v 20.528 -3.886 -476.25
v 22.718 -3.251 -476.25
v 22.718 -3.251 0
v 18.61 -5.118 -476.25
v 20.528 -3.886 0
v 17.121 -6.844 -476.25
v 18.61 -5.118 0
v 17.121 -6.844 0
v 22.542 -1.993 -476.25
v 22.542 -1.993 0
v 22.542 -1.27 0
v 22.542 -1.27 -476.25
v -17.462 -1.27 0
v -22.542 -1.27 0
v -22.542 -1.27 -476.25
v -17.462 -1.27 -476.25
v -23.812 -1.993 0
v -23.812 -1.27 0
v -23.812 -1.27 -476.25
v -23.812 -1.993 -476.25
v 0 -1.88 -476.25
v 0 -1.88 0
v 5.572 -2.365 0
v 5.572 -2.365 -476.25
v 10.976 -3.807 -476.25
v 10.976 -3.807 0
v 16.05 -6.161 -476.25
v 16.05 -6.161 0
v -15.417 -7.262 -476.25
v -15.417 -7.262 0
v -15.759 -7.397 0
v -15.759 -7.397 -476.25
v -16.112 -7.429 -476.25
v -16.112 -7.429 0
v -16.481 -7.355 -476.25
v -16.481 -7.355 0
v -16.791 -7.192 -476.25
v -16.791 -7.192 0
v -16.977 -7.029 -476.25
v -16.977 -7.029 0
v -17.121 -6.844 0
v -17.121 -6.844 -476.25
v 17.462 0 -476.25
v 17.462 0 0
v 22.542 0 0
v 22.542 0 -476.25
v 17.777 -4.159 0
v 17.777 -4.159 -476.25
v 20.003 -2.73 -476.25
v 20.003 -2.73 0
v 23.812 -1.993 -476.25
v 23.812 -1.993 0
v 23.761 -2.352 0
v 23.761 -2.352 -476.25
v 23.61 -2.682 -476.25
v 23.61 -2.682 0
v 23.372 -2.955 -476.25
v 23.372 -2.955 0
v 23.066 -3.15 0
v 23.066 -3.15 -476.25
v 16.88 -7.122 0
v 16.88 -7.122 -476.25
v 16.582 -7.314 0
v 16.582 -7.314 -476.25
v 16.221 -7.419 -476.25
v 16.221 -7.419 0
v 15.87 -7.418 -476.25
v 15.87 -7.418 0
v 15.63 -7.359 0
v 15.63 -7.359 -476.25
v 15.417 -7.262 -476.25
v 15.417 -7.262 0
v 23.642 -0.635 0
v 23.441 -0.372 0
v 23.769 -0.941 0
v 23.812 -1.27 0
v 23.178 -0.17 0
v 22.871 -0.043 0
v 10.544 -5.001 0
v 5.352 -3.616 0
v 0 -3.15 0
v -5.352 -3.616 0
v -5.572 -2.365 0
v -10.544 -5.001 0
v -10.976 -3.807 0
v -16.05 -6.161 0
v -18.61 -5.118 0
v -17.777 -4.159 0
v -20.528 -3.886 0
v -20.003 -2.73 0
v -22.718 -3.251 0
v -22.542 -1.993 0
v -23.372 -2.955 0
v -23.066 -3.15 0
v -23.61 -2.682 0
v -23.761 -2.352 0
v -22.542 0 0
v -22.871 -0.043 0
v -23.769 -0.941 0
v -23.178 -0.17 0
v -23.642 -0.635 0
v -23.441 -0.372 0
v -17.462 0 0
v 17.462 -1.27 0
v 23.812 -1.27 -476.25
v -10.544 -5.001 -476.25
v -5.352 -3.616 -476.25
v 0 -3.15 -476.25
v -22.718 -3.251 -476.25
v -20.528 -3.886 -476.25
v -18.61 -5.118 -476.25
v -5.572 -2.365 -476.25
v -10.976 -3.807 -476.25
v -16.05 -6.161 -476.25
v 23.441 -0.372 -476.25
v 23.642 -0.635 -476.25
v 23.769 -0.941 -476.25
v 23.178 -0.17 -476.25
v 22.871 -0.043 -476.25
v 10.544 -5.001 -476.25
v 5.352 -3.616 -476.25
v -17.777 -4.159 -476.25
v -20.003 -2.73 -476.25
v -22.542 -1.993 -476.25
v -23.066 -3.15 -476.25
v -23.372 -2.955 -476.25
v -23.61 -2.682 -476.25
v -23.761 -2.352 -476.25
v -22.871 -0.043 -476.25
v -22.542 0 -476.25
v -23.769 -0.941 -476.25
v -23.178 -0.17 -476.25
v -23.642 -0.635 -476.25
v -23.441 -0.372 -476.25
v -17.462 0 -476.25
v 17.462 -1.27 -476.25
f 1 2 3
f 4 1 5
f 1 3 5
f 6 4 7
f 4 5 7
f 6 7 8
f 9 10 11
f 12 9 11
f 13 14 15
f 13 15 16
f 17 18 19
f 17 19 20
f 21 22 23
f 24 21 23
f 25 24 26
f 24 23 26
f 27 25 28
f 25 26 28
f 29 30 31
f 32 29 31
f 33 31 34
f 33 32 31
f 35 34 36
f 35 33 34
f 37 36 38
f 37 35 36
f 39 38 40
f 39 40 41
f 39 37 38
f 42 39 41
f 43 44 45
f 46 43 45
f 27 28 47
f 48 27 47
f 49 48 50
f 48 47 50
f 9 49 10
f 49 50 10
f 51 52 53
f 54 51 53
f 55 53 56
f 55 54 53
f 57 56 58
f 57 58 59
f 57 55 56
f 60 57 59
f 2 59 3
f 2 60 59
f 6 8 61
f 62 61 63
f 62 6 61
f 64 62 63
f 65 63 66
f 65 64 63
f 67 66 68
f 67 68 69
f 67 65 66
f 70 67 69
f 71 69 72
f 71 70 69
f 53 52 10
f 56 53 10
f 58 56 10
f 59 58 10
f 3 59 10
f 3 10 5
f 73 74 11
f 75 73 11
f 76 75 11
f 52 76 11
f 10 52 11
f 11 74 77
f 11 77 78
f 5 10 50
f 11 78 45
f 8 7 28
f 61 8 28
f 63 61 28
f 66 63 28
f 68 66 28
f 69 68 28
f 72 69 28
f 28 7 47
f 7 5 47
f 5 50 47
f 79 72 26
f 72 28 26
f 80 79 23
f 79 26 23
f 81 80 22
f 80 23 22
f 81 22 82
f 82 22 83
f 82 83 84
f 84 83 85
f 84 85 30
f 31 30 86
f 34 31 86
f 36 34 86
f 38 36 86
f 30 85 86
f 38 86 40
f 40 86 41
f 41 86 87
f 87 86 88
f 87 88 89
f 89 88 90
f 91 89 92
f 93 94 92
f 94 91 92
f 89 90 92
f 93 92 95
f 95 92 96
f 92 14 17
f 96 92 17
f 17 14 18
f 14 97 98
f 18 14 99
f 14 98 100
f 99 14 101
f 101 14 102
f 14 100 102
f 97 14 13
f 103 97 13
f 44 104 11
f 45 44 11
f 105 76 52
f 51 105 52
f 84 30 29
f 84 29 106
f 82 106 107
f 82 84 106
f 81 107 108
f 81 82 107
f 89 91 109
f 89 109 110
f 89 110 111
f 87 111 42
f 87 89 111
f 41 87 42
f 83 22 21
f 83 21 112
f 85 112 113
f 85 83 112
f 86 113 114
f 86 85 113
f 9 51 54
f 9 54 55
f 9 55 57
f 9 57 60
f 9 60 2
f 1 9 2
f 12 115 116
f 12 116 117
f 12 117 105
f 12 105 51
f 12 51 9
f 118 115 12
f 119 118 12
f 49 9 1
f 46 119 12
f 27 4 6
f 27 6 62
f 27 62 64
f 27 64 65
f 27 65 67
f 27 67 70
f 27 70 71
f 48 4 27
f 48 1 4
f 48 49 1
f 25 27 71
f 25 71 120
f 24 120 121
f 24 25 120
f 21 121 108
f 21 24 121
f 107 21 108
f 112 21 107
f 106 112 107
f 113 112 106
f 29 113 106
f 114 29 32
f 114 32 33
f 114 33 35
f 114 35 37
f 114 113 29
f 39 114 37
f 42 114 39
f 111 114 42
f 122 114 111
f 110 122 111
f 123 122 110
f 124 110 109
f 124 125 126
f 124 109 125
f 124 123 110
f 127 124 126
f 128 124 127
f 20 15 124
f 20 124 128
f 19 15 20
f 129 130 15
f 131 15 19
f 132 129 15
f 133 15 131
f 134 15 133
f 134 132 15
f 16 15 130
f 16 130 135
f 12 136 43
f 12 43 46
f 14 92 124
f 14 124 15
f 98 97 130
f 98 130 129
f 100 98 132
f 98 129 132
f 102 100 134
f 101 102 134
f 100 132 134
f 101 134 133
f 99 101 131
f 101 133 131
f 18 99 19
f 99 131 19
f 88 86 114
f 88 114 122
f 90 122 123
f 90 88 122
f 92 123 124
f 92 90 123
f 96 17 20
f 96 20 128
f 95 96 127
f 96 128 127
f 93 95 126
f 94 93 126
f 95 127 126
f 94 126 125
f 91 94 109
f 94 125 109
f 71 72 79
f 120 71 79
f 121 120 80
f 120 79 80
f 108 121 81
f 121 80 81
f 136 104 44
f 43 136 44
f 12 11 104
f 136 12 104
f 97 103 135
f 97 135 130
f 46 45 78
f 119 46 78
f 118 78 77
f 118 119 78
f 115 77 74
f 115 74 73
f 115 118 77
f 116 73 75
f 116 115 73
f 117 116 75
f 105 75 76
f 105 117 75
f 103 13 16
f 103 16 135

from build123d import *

# Parameters (mm, degrees)
EXTRUDE_THIN1_DEPTH = 476.25
FILLET1_R           = 1.27


with BuildPart() as part:
    # Sketch1 → Extrude-Thin1 (new body)
    with BuildSketch(Plane.XY):
        with BuildLine():
            Line((-17.4625, 0), (-23.8125, 0))
            Line((-23.8125, 0), (-23.8125, -3.175))
            ThreePointArc((-23.8125, -3.175), (-19.4649522, -4.471511039), (-16.537661084, -7.9375))
            ThreePointArc((-16.537661084, -7.9375), (-8.60836669, -4.370835686), (0, -3.149841478))
            Line((0, -3.149841478), (0, -1.879841478))
            ThreePointArc((0, -1.879841478), (-8.305471157, -2.968488199), (-16.049802005, -6.160876419))
            ThreePointArc((-16.049802005, -6.160876419), (-18.838548597, -3.364089602), (-22.5425, -1.993006799))
            Line((-22.5425, -1.993006799), (-22.5425, -1.27))
            Line((-22.5425, -1.27), (-17.4625, -1.27))
            Line((-17.4625, -1.27), (-17.4625, 0))
        make_face()
    extrude(amount=-EXTRUDE_THIN1_DEPTH)

    # Mirror1: part across plane


with BuildPart() as part_1:
    add(part.part)
    add(part.part.mirror(Plane(origin=(0, -1.879841478, -476.25), x_dir=(0, 0, 1), z_dir=(-1, 0, 0))))

    # Fillet1
    fillet1_edges = [part_1.edges().sort_by_distance(p)[0] for p in [
        (-16.537661084, -7.9375, -238.125),
        (-23.8125, -3.175, -238.125),
        (-23.8125, 0, -238.125),
        (16.537661084, -7.9375, -238.125),
        (23.8125, -3.175, -238.125),
        (23.8125, 0, -238.125),
    ]]
    fillet(fillet1_edges, radius=FILLET1_R)


solid = part_1.part
